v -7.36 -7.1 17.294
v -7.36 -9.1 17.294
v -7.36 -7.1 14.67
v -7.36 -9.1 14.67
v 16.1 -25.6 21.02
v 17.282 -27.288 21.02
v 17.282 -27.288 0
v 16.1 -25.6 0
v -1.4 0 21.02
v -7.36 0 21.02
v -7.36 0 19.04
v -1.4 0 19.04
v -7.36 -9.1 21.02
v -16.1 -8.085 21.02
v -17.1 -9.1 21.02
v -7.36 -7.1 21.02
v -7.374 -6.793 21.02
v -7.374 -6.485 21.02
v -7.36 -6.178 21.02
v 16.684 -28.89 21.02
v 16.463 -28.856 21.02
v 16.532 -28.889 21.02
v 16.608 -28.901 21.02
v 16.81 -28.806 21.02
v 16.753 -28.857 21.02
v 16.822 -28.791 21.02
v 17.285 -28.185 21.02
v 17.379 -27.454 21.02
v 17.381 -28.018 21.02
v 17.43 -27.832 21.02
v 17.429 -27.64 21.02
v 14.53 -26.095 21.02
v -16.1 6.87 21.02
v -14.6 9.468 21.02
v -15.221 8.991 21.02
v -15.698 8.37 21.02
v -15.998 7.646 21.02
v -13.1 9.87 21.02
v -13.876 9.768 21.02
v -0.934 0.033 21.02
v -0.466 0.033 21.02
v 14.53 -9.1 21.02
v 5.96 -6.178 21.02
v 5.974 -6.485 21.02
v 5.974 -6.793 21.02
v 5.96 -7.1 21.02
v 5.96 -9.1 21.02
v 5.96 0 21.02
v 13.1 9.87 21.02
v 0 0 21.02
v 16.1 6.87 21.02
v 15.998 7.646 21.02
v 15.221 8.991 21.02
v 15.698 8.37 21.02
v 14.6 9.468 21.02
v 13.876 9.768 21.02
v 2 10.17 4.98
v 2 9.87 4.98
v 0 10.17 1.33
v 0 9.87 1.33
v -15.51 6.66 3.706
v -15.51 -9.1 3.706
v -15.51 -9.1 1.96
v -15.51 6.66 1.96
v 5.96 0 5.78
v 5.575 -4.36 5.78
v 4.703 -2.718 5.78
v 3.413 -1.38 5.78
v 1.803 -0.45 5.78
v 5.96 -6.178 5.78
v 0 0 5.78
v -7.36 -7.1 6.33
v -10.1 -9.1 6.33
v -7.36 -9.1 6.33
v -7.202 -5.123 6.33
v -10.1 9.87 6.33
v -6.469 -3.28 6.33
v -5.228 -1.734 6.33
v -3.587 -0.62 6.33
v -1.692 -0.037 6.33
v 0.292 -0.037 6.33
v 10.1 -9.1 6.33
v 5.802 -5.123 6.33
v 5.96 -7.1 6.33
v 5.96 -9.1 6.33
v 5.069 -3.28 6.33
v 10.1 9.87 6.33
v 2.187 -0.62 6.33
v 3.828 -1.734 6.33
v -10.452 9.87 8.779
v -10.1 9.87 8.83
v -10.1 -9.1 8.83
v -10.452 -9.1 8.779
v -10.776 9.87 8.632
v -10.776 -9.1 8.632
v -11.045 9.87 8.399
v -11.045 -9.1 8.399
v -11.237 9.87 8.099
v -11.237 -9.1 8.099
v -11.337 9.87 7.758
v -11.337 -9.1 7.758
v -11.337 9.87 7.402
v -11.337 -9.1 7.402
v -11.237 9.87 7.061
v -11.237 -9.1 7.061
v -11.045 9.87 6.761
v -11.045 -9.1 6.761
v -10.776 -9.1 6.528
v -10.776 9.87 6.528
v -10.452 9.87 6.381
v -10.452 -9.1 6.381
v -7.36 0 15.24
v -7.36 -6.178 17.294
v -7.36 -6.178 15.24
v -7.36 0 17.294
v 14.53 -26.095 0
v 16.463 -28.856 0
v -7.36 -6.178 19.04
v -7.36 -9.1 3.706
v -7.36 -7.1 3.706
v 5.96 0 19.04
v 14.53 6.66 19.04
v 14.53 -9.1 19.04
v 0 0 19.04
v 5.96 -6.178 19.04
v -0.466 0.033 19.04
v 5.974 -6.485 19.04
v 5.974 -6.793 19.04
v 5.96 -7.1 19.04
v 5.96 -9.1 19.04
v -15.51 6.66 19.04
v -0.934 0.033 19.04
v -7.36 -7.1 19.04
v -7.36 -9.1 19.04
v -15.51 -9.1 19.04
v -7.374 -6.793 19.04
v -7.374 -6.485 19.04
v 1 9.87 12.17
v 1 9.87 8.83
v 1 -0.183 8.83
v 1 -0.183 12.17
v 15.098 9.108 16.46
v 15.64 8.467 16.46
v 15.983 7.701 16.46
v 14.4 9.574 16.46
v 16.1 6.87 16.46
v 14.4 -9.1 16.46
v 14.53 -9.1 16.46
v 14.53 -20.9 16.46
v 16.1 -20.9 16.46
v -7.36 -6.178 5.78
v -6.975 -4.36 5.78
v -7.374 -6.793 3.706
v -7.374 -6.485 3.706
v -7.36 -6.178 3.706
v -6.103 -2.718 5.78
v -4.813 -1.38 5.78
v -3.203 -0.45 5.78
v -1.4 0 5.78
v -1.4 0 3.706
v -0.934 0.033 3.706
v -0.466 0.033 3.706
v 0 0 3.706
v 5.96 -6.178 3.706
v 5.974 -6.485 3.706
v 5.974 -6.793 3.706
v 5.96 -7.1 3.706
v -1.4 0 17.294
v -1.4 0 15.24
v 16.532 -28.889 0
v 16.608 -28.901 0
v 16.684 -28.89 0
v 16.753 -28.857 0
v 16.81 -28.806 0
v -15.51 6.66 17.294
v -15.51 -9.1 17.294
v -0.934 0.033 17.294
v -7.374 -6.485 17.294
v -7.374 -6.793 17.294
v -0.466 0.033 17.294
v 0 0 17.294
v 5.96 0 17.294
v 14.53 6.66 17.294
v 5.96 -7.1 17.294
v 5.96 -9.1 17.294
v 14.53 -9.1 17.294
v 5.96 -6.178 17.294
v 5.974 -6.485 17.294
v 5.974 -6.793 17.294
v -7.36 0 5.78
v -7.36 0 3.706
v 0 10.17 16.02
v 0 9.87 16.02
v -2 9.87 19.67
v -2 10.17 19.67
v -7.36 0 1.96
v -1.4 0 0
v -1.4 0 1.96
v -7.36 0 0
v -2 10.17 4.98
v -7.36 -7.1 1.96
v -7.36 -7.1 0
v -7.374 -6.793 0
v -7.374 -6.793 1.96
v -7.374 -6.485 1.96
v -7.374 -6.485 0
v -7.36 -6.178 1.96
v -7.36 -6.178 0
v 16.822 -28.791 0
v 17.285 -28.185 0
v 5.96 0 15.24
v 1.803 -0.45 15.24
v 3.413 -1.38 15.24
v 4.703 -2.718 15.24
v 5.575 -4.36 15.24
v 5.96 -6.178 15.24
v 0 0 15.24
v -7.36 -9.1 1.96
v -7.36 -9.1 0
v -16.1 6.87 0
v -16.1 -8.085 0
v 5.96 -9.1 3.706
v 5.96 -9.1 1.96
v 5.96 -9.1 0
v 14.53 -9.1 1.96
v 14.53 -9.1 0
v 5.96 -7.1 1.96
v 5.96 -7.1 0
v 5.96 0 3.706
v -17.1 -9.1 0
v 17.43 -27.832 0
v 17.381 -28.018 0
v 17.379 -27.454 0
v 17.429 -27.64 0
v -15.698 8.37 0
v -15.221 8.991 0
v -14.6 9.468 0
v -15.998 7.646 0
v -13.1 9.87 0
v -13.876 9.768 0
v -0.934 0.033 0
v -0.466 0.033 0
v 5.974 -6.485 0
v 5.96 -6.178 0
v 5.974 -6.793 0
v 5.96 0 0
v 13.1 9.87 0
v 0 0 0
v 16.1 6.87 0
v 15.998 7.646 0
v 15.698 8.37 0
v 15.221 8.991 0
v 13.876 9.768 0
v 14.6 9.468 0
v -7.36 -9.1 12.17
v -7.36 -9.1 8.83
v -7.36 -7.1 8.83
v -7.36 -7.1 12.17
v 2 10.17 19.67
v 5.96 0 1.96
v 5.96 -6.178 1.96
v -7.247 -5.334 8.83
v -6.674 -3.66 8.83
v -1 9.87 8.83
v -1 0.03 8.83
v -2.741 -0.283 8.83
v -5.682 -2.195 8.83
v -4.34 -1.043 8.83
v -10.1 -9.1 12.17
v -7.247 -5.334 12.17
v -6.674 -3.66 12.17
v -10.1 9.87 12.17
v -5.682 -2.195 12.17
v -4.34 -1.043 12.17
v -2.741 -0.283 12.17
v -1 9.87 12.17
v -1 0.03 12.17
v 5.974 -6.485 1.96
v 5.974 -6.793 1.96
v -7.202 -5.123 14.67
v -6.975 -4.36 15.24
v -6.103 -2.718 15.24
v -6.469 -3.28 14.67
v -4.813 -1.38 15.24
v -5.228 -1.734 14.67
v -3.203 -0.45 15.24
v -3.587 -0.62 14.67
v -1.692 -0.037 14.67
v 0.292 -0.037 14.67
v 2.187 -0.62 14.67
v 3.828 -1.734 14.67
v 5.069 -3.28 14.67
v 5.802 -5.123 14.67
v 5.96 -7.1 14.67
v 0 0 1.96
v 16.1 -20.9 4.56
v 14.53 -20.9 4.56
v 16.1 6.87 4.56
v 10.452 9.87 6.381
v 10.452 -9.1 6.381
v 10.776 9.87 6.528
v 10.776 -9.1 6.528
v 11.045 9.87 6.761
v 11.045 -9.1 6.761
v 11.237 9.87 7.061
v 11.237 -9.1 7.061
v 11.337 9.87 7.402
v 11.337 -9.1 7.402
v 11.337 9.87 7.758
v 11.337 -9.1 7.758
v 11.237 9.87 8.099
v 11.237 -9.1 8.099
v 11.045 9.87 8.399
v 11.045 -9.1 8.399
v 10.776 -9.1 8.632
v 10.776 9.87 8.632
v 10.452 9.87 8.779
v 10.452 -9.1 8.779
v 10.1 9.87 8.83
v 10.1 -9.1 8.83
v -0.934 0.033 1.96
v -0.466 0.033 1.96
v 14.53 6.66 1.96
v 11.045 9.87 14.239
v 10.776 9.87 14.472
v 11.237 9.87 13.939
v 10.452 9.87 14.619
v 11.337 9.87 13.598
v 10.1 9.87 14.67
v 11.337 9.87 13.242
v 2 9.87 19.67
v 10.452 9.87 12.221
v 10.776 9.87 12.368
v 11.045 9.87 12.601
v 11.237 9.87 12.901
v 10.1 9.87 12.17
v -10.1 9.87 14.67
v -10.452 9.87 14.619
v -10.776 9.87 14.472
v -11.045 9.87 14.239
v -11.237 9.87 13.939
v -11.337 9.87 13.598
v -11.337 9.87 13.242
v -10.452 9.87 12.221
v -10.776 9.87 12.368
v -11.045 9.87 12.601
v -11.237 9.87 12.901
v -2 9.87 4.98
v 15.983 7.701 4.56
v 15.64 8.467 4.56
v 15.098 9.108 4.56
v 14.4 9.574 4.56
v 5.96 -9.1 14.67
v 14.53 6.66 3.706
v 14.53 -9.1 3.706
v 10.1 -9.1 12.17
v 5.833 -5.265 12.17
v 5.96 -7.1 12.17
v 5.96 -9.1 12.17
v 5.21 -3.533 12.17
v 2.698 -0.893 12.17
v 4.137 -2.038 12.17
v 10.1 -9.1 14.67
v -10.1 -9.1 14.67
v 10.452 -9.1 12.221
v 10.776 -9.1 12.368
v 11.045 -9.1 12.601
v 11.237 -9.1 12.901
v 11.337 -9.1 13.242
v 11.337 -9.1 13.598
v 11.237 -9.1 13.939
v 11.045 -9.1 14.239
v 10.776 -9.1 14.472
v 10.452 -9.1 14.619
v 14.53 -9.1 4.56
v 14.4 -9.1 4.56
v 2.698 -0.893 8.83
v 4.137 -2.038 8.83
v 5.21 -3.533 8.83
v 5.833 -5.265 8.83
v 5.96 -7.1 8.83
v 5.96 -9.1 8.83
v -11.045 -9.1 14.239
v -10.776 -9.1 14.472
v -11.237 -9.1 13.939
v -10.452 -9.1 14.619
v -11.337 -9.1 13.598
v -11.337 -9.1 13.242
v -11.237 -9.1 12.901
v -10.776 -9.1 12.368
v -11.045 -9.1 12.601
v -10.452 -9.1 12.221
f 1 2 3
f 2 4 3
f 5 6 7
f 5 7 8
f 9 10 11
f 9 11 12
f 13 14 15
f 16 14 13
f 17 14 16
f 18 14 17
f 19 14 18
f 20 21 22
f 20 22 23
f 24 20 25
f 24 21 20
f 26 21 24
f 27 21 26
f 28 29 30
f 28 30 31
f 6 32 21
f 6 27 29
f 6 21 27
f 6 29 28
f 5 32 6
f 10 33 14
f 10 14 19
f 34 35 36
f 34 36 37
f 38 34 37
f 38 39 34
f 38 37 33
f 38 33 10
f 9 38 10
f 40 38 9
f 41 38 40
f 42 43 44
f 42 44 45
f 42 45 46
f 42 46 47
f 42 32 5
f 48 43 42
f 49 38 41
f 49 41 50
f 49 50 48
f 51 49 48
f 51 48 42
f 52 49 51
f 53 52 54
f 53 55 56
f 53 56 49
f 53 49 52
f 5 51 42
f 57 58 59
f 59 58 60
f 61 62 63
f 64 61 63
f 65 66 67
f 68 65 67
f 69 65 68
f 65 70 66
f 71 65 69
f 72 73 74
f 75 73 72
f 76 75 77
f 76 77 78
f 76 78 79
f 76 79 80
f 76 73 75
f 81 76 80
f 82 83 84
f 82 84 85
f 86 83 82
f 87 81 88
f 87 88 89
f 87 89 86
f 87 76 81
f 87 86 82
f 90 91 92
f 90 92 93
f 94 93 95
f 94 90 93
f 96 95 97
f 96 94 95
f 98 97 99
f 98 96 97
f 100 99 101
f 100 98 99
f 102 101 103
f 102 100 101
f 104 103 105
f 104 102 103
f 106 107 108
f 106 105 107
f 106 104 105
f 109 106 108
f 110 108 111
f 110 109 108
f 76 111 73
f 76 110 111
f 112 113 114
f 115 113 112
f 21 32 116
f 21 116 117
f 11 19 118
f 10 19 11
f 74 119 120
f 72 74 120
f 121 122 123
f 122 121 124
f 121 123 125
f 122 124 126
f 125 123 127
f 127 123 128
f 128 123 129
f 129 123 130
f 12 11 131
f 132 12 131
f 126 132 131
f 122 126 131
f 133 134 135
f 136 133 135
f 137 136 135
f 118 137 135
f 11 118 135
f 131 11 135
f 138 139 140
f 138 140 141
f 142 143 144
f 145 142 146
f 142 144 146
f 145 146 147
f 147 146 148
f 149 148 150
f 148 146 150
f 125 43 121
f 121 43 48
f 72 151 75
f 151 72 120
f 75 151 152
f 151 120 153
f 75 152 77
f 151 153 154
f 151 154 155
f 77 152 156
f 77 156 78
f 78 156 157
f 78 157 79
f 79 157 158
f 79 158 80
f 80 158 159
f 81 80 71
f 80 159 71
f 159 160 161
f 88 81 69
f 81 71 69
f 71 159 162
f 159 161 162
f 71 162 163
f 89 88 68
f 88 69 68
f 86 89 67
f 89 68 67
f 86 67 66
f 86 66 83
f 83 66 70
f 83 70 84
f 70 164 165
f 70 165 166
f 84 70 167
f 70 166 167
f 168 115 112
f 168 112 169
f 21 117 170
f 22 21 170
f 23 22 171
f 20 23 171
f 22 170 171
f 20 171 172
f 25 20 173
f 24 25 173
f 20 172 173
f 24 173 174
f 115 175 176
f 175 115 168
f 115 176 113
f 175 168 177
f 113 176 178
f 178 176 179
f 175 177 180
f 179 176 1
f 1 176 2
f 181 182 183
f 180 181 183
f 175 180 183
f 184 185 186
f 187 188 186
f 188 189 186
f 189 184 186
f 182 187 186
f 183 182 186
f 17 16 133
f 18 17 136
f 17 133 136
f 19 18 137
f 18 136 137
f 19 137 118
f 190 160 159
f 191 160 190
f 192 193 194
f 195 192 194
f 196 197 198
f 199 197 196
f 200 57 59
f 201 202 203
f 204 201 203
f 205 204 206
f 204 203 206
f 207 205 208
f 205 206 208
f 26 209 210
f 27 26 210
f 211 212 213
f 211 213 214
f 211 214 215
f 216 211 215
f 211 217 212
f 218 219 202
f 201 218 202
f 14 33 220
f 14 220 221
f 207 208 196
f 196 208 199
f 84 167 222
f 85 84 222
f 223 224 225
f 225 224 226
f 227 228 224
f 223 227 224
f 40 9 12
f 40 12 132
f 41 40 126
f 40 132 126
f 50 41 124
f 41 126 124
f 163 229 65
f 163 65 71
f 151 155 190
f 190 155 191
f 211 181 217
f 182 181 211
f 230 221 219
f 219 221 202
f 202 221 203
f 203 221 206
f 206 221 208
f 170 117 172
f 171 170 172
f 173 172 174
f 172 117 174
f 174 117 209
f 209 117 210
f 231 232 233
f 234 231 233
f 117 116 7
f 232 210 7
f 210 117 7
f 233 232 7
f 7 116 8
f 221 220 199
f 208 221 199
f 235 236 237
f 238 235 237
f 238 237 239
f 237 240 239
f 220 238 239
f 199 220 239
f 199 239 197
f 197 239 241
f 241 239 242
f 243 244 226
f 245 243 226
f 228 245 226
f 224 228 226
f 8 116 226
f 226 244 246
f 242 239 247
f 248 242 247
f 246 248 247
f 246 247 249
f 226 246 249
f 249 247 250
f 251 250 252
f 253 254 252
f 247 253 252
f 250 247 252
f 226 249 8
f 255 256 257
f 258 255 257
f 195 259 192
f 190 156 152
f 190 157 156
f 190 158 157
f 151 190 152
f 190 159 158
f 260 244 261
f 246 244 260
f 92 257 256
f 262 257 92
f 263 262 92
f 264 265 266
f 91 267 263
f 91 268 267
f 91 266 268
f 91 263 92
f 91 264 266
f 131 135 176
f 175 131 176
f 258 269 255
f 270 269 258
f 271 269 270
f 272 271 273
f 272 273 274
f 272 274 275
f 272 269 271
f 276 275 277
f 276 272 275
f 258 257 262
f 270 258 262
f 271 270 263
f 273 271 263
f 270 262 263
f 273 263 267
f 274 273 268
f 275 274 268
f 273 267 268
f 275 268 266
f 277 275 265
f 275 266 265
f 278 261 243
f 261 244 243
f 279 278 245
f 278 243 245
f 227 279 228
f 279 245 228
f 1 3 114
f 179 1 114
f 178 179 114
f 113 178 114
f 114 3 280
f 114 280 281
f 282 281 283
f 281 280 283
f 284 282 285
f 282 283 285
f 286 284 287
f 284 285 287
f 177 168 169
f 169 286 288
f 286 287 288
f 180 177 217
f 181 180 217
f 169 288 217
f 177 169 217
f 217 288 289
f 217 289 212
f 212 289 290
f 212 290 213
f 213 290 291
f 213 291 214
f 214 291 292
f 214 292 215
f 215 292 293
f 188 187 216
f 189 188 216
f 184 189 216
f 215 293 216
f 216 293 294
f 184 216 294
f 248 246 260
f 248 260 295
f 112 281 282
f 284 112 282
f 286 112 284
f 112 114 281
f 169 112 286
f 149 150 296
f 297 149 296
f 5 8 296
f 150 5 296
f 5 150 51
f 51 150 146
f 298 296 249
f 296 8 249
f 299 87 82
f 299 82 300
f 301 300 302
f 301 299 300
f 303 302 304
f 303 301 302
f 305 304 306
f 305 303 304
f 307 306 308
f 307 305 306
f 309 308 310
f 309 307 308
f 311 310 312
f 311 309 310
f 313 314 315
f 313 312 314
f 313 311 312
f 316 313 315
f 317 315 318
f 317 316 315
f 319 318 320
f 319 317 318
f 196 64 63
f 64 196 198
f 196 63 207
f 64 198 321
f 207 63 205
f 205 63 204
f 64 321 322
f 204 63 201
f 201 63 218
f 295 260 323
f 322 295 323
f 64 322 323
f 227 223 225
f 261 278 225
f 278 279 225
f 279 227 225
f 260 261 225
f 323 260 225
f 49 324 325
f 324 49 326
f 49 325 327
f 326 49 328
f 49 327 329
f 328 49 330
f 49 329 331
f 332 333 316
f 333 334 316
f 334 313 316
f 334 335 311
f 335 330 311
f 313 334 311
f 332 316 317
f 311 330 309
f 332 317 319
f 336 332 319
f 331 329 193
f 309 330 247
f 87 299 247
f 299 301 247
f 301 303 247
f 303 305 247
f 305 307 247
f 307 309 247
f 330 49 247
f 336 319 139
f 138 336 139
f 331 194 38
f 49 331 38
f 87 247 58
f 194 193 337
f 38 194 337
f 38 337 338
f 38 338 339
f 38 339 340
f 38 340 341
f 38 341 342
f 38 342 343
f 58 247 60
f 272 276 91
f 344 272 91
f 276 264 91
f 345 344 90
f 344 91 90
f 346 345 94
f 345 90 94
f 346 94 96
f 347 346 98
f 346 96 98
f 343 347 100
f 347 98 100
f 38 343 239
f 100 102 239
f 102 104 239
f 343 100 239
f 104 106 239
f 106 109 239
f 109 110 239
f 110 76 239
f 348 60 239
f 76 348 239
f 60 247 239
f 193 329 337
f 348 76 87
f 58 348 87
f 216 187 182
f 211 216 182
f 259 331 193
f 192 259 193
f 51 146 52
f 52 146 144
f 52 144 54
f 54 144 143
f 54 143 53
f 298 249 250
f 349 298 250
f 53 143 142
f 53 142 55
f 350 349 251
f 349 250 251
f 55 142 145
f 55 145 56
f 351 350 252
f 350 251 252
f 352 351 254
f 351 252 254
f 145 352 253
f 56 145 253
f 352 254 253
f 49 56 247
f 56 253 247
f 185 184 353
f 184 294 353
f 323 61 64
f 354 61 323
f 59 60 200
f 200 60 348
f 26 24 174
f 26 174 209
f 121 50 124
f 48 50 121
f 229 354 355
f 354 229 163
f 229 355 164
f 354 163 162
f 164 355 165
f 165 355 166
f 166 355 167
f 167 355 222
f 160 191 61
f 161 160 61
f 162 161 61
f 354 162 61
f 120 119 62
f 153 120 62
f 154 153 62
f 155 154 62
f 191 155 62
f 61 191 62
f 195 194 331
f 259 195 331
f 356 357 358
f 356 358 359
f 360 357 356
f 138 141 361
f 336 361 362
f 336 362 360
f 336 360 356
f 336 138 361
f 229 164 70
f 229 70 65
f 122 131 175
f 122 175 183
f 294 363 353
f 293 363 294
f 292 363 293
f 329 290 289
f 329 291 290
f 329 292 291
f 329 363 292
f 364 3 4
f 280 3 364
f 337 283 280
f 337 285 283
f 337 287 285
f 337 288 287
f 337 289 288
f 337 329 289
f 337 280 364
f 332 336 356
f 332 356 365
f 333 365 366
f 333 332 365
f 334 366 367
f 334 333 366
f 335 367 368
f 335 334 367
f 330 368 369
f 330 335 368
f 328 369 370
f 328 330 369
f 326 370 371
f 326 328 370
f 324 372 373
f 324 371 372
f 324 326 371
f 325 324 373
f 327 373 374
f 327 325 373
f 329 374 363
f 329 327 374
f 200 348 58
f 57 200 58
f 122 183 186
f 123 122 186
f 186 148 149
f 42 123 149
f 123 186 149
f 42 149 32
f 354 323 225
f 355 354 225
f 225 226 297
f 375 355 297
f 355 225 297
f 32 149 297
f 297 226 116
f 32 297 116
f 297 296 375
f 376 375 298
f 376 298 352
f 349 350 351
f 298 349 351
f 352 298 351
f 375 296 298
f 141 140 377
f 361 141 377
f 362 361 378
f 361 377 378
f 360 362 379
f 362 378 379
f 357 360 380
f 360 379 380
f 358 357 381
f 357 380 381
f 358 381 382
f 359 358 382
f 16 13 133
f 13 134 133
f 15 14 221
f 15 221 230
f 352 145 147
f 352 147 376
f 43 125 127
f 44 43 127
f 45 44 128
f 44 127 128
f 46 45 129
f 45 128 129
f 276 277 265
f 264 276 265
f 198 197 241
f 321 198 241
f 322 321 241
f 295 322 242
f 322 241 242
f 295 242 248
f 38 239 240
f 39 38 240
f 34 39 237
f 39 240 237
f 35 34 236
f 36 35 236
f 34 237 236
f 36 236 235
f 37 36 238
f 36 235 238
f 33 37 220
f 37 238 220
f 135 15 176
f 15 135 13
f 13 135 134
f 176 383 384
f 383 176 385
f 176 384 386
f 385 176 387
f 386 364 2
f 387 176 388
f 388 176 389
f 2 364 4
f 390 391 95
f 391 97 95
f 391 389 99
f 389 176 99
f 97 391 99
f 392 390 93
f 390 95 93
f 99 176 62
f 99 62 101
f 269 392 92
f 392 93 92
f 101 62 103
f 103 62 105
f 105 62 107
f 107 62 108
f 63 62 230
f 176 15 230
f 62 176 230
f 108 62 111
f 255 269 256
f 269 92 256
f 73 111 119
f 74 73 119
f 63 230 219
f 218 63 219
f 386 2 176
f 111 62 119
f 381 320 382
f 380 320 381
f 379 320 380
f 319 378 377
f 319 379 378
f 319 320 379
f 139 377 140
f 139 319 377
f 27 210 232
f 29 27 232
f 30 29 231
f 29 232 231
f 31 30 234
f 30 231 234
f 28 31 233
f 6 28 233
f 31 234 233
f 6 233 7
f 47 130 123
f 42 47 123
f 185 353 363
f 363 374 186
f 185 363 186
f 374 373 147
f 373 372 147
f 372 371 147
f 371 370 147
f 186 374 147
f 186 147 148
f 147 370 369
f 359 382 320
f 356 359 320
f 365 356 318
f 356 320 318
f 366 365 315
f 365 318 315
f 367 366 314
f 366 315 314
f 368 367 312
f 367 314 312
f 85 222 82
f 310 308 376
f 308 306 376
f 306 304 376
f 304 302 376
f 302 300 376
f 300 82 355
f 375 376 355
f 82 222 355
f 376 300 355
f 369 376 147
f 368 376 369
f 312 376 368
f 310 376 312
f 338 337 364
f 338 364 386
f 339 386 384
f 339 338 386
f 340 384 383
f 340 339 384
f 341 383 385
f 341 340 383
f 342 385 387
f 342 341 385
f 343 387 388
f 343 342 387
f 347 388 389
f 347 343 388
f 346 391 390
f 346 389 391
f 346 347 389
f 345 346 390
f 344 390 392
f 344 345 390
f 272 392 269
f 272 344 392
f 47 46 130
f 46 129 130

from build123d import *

# Parameters (mm, degrees)
SALIENTE_EXTRUIR1_DEPTH = 21.02
CORTAR_EXTRUIR1_DEPTH   = 48.423848102
SALIENTE_EXTRUIR2_DEPTH = 0.3
CORTAR_EXTRUIR2_DEPTH   = 1.7
CROQUIS6_W              = 13.32
CROQUIS6_H              = 9.1
CORTAR_EXTRUIR3_DEPTH   = 5.78
CROQUIS7_W              = 13.32
CROQUIS7_H              = 9.1
CORTAR_EXTRUIR4_DEPTH   = 5.78
CROQUIS8_W              = 21.89
CROQUIS8_H              = 1.74582909
CORTAR_EXTRUIR5_DEPTH   = 15.76


with BuildPart() as part:
    # Croquis2 → Saliente-Extruir1 (new body)
    with BuildSketch(Plane.XY):
        with BuildLine():
            Line((16.1, -25.6), (16.1, -9.1))
            Line((16.1, -9.1), (16.1, 6.87))
            ThreePointArc((16.1, 6.87), (15.221320344, 8.991320344), (13.1, 9.87))
            Line((13.1, 9.87), (-13.1, 9.87))
            ThreePointArc((-13.1, 9.87), (-15.221320344, 8.991320344), (-16.1, 6.87))
            Line((-16.1, 6.87), (-16.1, -8.084842917))
            Line((-16.1, -8.084842917), (-17.1, -9.1))
            Line((-17.1, -9.1), (-16.1, -9.1))
            Line((-16.1, -9.1), (-7.36, -9.1))
            Line((-7.36, -9.1), (-7.36, -7.1))
            ThreePointArc((-7.36, -7.1), (-0.7, 0.036800452), (5.96, -7.1))
            Line((5.96, -7.1), (5.96, -9.1))
            Line((5.96, -9.1), (14.53, -9.1))
            Line((14.53, -9.1), (14.53, -26.095019099))
            Line((14.53, -26.095019099), (16.46294155, -28.855545721))
            ThreePointArc((16.46294155, -28.855545721), (16.646307517, -28.898064095), (16.810355034, -28.805764032))
            Line((16.810355034, -28.805764032), (16.821593757, -28.791058008))
            Line((16.821593757, -28.791058008), (17.28495009, -28.184749839))
            ThreePointArc((17.28495009, -28.184749839), (17.43599966, -27.735907903), (17.281999232, -27.288069848))
            Line((17.281999232, -27.288069848), (16.1, -25.6))
        make_face()
    extrude(amount=SALIENTE_EXTRUIR1_DEPTH)

    # Croquis3 → Cortar-Extruir1 (cut, through all)
    with BuildSketch(Plane(origin=(0, 9.87, 0), x_dir=(1, 0, 0), z_dir=(0, 1, 0))):
        with BuildLine():
            Line((-10.1, -12.17), (-1, -12.17))
            Line((-1, -12.17), (-1, -8.83))
            Line((-1, -8.83), (-10.1, -8.83))
            ThreePointArc((-10.1, -8.83), (-11.35, -7.58), (-10.1, -6.33))
            Line((-10.1, -6.33), (10.1, -6.33))
            ThreePointArc((10.1, -6.33), (11.35, -7.58), (10.1, -8.83))
            Line((10.1, -8.83), (1, -8.83))
            Line((1, -8.83), (1, -12.17))
            Line((1, -12.17), (10.1, -12.17))
            ThreePointArc((10.1, -12.17), (11.35, -13.42), (10.1, -14.67))
            Line((10.1, -14.67), (-10.1, -14.67))
            ThreePointArc((-10.1, -14.67), (-11.35, -13.42), (-10.1, -12.17))
        make_face()
    extrude(amount=-CORTAR_EXTRUIR1_DEPTH, mode=Mode.SUBTRACT)

    # Croquis4 → Saliente-Extruir2 (add)
    with BuildSketch(Plane(origin=(0, 9.87, 0), x_dir=(-1, 0, 0), z_dir=(0, 1, 0))):
        Polygon((0, 16.02), (2, 19.67), (-2, 19.67), align=None)
        Polygon((2, 4.98), (-2, 4.98), (0, 1.33), align=None)
    extrude(amount=SALIENTE_EXTRUIR2_DEPTH)

    # Croquis5 → Cortar-Extruir2 (cut)
    with BuildSketch(Plane(origin=(16.1, 0, 0), x_dir=(0, 0, -1), z_dir=(1, 0, 0))):
        Polygon((-16.46, 6.87), (-16.46, -20.9), (-10.51, -20.9), (-4.56, -20.9), (-4.56, 6.87), align=None)
        Polygon((-16.46, 9.815378902), (-16.46, 6.87), (-4.56, 6.87), (-4.56, 10.17), align=None)
    extrude(amount=-CORTAR_EXTRUIR2_DEPTH, mode=Mode.SUBTRACT)

    # Croquis6 → Cortar-Extruir3 (cut)
    with BuildSketch(Plane(origin=(0, 0, 0), x_dir=(-1, 0, 0), z_dir=(0, 0, -1))):
        with Locations((0.7, -4.55)):
            Rectangle(CROQUIS6_W, CROQUIS6_H)
    extrude(amount=-CORTAR_EXTRUIR3_DEPTH, mode=Mode.SUBTRACT)

    # Croquis7 → Cortar-Extruir4 (cut)
    with BuildSketch(Plane.XY.offset(21.02)):
        with Locations((-0.7, -4.55)):
            Rectangle(CROQUIS7_W, CROQUIS7_H)
    extrude(amount=-CORTAR_EXTRUIR4_DEPTH, mode=Mode.SUBTRACT)

    # Croquis8 → Cortar-Extruir5 (cut)
    with BuildSketch(Plane.XZ.offset(9.1)):
        Polygon((-7.36, 19.04), (-9.552269286, 19.04), (-15.51, 19.04), (-15.51, 17.29417091), (-9.552269286, 17.29417091), (-7.36, 17.29417091), align=None)
        with Locations((3.585, 18.167085455)):
            Rectangle(CROQUIS8_W, CROQUIS8_H)
        with Locations((3.585, 2.832914545)):
            Rectangle(CROQUIS8_W, CROQUIS8_H)
        Polygon((-15.51, 3.70582909), (-15.51, 1.96), (-9.552269286, 1.96), (-7.36, 1.96), (-7.36, 3.70582909), (-9.552269286, 3.70582909), align=None)
    extrude(amount=-CORTAR_EXTRUIR5_DEPTH, mode=Mode.SUBTRACT)


solid = part.part
